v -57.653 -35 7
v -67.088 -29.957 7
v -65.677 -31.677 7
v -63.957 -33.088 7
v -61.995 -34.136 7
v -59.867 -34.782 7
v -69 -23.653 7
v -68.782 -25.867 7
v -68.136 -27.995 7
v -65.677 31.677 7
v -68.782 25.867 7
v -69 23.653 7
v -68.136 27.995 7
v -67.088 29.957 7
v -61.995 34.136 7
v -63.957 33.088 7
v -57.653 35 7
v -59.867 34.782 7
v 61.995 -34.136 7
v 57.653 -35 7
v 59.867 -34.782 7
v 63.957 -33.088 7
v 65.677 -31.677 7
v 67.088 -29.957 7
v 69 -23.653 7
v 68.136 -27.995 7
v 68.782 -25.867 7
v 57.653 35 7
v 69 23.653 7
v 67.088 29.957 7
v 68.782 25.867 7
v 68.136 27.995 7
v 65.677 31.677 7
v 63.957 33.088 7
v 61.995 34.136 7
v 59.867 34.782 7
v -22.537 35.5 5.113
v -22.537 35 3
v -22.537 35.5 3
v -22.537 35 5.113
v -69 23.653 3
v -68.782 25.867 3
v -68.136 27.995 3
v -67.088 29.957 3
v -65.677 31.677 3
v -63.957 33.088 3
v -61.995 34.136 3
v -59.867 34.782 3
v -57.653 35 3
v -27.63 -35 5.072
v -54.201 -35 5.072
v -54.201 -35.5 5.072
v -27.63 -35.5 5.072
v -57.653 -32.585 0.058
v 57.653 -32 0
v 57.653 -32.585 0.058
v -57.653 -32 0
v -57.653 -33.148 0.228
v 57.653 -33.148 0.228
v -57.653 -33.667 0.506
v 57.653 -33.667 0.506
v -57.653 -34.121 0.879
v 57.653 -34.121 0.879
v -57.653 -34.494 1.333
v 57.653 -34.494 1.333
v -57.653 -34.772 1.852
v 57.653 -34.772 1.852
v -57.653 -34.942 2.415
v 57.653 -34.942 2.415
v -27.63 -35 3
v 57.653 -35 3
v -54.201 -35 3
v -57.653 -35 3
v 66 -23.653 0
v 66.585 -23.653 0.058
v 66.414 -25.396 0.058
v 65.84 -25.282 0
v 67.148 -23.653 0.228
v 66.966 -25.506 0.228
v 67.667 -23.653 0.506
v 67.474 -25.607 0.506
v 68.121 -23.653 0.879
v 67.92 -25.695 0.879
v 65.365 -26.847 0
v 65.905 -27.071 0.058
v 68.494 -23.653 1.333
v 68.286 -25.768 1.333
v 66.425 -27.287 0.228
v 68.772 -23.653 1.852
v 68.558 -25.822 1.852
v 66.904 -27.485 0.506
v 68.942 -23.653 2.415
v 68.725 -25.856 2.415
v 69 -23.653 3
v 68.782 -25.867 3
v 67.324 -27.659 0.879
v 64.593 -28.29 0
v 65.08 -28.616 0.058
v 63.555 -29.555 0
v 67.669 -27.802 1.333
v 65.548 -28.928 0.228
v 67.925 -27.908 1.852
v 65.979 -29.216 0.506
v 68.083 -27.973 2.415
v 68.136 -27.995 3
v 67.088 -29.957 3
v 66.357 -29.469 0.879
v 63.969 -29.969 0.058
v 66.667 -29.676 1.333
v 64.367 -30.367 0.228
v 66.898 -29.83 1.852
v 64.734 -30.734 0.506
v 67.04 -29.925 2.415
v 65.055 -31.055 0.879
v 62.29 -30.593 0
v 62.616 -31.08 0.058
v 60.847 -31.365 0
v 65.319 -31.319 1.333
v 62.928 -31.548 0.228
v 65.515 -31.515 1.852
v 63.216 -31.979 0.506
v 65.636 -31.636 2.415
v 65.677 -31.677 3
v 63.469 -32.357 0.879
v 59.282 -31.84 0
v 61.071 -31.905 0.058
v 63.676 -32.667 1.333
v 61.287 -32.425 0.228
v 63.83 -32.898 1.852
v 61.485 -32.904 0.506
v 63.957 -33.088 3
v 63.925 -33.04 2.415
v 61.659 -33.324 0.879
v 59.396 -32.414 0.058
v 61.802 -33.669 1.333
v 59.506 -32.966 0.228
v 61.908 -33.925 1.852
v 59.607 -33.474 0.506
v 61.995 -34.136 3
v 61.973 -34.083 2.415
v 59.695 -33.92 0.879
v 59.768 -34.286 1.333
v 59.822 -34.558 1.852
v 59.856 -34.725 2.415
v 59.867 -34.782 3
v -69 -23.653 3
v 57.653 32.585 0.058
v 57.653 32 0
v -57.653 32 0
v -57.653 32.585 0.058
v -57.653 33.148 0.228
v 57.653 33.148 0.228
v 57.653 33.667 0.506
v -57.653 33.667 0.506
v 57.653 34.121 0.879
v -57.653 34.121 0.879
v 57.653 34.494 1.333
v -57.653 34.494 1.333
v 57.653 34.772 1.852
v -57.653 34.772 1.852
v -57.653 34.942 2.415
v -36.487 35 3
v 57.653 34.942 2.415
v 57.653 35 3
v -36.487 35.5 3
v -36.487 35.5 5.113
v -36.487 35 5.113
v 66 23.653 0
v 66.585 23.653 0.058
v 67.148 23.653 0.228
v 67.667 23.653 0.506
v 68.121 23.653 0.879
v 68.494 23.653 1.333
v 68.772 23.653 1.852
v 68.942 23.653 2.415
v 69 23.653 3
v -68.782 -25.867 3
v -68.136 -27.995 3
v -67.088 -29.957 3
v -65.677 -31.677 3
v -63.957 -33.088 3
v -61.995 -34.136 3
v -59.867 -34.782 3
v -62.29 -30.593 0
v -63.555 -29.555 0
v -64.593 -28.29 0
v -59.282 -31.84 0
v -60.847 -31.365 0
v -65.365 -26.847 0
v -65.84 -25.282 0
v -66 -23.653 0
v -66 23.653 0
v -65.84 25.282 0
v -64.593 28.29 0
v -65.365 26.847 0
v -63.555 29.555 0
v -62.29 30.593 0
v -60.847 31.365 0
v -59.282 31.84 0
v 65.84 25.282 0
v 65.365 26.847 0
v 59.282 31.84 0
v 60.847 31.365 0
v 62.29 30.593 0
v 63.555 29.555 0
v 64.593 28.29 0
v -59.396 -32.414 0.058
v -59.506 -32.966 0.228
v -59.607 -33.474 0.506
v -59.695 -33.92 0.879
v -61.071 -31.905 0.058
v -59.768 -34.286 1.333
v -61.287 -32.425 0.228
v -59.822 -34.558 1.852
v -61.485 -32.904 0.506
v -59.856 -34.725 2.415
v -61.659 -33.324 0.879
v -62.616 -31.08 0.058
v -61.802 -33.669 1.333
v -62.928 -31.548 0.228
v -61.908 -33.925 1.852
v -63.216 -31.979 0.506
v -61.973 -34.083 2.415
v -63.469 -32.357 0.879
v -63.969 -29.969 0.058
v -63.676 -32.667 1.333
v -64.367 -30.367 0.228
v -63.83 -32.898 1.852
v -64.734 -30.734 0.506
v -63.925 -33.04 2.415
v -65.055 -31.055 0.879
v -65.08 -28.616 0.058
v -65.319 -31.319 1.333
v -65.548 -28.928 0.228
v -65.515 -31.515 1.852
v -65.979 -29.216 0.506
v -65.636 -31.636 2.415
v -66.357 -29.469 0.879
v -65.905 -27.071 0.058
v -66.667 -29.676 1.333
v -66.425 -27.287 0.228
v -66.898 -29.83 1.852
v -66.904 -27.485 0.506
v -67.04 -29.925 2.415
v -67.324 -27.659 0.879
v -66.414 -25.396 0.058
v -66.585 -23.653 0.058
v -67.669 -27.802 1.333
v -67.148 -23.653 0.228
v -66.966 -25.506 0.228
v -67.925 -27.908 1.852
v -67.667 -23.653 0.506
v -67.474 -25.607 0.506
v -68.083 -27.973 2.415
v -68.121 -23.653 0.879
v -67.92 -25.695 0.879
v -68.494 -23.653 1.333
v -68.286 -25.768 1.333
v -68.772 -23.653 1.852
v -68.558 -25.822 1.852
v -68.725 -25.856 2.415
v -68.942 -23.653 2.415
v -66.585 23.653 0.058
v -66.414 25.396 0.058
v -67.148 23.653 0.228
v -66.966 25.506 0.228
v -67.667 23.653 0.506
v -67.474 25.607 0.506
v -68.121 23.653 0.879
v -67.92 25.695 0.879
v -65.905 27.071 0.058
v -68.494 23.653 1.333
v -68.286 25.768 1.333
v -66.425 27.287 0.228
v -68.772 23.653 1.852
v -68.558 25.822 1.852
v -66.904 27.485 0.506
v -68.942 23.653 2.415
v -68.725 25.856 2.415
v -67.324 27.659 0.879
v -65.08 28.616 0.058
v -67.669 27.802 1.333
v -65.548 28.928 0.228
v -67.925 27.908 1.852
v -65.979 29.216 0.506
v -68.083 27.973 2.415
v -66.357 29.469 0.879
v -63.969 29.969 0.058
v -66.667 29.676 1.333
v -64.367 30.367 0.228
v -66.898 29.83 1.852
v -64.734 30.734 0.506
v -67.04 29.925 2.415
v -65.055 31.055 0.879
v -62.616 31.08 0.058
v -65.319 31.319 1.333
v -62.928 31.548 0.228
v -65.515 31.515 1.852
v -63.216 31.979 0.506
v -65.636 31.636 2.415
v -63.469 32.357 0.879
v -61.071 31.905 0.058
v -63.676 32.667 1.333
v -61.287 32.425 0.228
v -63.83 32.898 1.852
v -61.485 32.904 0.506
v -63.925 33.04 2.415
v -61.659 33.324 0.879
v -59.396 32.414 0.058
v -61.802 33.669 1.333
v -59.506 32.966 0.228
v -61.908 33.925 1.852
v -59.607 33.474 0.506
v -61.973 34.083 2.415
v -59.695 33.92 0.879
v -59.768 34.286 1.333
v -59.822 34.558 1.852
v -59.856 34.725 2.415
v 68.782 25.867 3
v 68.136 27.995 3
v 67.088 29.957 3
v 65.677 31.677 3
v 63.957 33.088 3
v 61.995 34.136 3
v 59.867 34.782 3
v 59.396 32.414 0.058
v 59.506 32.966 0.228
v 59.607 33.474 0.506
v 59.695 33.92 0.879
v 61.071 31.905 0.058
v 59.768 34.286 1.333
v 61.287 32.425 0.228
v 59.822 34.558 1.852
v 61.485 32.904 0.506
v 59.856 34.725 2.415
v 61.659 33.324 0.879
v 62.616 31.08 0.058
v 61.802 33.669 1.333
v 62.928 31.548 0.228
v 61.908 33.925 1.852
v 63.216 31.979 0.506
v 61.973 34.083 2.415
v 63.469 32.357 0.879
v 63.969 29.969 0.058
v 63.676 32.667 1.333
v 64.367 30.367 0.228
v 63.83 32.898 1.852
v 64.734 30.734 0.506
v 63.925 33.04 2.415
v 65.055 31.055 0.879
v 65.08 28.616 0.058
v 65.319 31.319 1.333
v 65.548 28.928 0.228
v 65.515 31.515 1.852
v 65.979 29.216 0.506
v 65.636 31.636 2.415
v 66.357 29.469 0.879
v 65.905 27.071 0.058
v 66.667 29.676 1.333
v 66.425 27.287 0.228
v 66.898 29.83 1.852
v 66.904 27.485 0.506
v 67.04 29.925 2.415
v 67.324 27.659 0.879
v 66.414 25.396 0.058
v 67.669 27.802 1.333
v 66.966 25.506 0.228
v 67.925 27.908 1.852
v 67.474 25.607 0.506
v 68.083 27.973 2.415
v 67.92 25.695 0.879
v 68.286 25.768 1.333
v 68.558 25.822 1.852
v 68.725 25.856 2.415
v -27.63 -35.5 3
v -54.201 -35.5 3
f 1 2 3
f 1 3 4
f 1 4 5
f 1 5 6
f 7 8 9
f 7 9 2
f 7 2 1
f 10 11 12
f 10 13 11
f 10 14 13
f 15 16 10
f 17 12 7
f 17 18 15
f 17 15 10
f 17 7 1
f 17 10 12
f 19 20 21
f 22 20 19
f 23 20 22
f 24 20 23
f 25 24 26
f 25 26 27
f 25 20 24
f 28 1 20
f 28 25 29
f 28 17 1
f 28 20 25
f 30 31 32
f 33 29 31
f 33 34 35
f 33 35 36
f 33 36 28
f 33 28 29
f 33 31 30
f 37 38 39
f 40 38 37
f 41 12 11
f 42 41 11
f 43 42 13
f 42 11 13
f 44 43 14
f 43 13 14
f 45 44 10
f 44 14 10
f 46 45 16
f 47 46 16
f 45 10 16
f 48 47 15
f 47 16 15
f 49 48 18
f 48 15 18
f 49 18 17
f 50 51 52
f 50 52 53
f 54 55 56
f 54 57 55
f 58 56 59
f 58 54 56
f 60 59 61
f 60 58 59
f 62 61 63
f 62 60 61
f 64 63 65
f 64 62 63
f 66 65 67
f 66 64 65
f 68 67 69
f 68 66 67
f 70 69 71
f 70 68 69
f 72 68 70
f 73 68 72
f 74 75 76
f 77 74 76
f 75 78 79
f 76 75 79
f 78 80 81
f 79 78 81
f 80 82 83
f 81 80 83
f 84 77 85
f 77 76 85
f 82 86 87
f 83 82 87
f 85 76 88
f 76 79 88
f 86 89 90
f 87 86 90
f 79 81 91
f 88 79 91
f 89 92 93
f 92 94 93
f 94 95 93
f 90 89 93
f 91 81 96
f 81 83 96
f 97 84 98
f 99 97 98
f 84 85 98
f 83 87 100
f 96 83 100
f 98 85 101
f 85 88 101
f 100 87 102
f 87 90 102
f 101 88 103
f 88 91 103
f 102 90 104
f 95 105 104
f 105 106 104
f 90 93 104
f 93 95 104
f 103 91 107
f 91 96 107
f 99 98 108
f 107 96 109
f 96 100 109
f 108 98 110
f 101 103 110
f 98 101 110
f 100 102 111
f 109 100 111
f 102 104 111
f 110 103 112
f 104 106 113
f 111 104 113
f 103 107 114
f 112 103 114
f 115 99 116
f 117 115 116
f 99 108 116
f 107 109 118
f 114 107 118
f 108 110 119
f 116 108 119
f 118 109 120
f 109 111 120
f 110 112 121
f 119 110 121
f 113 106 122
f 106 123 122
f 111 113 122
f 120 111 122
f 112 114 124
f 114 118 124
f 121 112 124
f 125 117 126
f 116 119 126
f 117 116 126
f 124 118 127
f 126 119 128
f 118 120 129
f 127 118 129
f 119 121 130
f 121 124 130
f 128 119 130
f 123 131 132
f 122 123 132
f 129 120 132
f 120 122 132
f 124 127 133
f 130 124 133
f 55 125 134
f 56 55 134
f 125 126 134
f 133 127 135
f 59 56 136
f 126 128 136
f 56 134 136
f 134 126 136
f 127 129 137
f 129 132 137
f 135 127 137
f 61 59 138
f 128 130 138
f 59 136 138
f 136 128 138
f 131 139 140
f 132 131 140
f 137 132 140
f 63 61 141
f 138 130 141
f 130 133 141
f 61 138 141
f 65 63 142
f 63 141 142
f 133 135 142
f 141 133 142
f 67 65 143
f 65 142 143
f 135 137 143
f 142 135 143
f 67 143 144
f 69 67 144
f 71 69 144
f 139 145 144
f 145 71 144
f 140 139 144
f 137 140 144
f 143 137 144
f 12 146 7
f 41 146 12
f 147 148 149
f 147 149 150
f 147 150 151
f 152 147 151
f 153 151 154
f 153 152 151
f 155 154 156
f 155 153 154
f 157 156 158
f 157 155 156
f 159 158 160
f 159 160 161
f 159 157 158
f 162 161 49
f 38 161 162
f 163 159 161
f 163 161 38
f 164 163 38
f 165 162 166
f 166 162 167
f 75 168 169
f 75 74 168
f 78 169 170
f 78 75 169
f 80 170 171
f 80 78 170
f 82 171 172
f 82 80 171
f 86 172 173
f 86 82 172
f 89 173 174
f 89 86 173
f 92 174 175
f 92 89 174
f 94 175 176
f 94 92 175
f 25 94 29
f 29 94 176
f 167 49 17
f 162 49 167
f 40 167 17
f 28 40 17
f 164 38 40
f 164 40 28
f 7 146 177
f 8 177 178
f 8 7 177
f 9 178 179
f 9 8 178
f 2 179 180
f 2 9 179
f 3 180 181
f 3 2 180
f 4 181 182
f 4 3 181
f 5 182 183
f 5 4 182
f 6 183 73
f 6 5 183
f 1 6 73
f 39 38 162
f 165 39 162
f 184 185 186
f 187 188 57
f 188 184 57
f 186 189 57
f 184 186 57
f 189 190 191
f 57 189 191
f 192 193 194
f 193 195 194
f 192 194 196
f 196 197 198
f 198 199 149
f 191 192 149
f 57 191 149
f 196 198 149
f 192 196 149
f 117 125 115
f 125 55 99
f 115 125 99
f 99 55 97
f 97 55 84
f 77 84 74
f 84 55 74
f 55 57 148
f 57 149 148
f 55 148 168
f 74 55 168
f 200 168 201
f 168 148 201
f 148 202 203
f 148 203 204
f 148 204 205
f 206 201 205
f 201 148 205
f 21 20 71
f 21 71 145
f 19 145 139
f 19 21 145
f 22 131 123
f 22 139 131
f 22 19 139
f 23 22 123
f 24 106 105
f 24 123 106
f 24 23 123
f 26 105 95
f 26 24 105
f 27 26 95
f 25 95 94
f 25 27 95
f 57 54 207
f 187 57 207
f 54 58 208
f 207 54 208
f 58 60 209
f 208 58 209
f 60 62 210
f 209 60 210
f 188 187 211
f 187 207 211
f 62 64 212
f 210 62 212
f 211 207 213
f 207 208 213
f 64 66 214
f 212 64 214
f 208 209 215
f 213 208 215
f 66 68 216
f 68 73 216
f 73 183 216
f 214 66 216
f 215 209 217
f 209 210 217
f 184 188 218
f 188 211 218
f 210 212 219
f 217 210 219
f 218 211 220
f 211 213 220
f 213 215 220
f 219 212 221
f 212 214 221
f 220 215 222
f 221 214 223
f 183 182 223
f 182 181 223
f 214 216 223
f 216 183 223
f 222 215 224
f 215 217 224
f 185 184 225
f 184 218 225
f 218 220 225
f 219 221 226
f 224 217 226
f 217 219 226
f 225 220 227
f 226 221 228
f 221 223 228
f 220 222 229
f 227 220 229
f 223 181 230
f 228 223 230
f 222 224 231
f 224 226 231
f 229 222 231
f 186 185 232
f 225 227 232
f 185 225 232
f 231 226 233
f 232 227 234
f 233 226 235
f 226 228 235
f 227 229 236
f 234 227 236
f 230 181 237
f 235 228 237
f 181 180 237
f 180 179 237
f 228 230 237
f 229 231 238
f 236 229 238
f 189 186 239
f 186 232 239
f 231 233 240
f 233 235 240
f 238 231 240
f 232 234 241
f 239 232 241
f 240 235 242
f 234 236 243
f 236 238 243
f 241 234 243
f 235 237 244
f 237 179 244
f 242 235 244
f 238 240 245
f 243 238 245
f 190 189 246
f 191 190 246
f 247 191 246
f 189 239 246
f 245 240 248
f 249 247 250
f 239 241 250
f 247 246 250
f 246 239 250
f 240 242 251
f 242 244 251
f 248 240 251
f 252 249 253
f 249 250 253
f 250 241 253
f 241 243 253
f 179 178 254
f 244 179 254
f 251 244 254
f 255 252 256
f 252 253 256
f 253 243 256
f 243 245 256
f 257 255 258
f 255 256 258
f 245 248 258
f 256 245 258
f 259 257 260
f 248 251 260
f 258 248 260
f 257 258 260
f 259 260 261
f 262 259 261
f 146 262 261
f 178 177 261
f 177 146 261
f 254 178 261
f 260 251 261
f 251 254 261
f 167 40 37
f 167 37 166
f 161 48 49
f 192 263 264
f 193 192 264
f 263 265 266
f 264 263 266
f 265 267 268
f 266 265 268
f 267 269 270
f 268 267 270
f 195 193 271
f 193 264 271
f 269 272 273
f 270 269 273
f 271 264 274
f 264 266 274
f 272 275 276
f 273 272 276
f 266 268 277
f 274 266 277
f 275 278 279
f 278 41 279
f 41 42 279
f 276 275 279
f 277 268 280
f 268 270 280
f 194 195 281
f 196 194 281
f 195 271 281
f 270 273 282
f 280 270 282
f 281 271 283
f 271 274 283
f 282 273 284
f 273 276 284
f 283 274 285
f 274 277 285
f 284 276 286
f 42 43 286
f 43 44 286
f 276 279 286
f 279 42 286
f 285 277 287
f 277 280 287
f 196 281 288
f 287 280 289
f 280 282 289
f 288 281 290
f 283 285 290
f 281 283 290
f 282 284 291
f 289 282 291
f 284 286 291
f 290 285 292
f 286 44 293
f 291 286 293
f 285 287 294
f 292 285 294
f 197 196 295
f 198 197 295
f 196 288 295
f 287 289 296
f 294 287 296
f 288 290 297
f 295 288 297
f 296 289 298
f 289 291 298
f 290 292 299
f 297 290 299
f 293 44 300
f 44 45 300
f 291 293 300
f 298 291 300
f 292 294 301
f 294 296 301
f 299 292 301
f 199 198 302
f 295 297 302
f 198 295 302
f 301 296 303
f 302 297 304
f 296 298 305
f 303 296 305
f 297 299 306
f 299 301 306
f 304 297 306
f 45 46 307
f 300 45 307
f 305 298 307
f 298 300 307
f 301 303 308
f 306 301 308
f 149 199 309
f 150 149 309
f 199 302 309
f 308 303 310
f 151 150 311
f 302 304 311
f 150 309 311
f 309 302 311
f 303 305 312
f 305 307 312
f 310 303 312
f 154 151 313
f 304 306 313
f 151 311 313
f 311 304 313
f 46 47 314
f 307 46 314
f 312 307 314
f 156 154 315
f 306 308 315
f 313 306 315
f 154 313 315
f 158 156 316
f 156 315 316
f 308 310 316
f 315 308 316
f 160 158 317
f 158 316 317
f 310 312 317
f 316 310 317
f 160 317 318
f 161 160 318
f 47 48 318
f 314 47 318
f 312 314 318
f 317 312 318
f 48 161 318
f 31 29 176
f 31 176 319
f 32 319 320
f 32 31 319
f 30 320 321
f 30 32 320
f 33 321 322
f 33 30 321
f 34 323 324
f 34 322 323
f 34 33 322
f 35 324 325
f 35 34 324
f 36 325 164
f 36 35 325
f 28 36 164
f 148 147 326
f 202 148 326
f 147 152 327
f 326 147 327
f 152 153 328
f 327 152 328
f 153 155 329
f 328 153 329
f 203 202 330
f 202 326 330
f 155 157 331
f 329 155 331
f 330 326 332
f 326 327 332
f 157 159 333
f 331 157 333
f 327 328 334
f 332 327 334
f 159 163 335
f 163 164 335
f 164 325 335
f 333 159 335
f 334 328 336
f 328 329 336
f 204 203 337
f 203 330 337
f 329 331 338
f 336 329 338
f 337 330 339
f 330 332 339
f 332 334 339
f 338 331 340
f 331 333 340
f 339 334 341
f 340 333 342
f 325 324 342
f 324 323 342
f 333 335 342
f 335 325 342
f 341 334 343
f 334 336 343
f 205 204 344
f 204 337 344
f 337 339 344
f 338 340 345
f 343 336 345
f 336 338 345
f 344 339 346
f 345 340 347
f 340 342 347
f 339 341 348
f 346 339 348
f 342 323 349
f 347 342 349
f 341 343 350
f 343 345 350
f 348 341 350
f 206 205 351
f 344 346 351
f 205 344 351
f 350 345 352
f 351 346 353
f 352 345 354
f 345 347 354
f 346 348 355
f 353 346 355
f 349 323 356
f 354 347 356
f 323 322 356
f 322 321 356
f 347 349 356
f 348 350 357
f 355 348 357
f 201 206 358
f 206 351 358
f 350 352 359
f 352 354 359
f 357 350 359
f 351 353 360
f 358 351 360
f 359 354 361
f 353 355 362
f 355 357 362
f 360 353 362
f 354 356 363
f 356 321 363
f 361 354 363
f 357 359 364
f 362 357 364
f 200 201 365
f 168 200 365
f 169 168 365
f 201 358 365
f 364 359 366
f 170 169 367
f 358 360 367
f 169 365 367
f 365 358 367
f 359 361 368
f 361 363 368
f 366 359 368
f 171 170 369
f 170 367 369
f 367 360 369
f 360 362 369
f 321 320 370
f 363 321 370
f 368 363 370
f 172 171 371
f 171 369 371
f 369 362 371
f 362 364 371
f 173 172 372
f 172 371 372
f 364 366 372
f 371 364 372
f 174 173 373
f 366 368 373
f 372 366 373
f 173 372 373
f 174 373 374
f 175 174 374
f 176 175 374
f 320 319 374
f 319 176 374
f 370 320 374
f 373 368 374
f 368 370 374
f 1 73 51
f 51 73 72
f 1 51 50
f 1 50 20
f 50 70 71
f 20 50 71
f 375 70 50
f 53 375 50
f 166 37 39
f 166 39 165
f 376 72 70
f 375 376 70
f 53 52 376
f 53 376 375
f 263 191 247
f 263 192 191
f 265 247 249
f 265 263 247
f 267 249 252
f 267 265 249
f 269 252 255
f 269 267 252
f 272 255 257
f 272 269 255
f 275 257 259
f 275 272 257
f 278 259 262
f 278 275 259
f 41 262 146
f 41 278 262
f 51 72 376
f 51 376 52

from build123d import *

# Parameters (mm, degrees)
F0_W     = 138
F0_H     = 70
F1_DEPTH = 7
F2_R     = 11.346804
F3_R     = 3
F4_W     = 26.570709
F4_H     = 2.072412
F5_DEPTH = 0.5
F6_W     = 13.949622
F6_H     = 2.113027
F7_DEPTH = 0.5


with BuildPart() as f1:
    # F0 (on Top) → F1 (new body)
    with BuildSketch(Plane.XY):
        Rectangle(F0_W, F0_H)
    extrude(amount=F1_DEPTH)

    # F2
    f2_edges = [f1.edges().sort_by_distance(p)[0] for p in [
        (69, -35, 3.5),
        (69, 35, 3.5),
        (-69, -35, 3.5),
        (-69, 35, 3.5),
    ]]
    fillet(f2_edges, radius=F2_R)

    # F3
    f3_edges = [f1.edges().sort_by_distance(p)[0] for p in [
        (0, 35, 0),
        (0, -35, 0),
        (-69, 0, 0),
        (69, 0, 0),
    ]]
    fillet(f3_edges, radius=F3_R)

    # F4 (on face) → F5 (join)
    with BuildSketch(Plane.XZ.offset(35)):
        with Locations((-40.915458, 4.036206)):
            Rectangle(F4_W, F4_H)
    extrude(amount=F5_DEPTH)

    # F6 (on face) → F7 (join)
    with BuildSketch(Plane(origin=(0, 35, 0), x_dir=(-1, 0, 0), z_dir=(0, 1, 0))):
        with Locations((29.512195, 4.056513)):
            Rectangle(F6_W, F6_H)
    extrude(amount=F7_DEPTH)


solid = f1.part
